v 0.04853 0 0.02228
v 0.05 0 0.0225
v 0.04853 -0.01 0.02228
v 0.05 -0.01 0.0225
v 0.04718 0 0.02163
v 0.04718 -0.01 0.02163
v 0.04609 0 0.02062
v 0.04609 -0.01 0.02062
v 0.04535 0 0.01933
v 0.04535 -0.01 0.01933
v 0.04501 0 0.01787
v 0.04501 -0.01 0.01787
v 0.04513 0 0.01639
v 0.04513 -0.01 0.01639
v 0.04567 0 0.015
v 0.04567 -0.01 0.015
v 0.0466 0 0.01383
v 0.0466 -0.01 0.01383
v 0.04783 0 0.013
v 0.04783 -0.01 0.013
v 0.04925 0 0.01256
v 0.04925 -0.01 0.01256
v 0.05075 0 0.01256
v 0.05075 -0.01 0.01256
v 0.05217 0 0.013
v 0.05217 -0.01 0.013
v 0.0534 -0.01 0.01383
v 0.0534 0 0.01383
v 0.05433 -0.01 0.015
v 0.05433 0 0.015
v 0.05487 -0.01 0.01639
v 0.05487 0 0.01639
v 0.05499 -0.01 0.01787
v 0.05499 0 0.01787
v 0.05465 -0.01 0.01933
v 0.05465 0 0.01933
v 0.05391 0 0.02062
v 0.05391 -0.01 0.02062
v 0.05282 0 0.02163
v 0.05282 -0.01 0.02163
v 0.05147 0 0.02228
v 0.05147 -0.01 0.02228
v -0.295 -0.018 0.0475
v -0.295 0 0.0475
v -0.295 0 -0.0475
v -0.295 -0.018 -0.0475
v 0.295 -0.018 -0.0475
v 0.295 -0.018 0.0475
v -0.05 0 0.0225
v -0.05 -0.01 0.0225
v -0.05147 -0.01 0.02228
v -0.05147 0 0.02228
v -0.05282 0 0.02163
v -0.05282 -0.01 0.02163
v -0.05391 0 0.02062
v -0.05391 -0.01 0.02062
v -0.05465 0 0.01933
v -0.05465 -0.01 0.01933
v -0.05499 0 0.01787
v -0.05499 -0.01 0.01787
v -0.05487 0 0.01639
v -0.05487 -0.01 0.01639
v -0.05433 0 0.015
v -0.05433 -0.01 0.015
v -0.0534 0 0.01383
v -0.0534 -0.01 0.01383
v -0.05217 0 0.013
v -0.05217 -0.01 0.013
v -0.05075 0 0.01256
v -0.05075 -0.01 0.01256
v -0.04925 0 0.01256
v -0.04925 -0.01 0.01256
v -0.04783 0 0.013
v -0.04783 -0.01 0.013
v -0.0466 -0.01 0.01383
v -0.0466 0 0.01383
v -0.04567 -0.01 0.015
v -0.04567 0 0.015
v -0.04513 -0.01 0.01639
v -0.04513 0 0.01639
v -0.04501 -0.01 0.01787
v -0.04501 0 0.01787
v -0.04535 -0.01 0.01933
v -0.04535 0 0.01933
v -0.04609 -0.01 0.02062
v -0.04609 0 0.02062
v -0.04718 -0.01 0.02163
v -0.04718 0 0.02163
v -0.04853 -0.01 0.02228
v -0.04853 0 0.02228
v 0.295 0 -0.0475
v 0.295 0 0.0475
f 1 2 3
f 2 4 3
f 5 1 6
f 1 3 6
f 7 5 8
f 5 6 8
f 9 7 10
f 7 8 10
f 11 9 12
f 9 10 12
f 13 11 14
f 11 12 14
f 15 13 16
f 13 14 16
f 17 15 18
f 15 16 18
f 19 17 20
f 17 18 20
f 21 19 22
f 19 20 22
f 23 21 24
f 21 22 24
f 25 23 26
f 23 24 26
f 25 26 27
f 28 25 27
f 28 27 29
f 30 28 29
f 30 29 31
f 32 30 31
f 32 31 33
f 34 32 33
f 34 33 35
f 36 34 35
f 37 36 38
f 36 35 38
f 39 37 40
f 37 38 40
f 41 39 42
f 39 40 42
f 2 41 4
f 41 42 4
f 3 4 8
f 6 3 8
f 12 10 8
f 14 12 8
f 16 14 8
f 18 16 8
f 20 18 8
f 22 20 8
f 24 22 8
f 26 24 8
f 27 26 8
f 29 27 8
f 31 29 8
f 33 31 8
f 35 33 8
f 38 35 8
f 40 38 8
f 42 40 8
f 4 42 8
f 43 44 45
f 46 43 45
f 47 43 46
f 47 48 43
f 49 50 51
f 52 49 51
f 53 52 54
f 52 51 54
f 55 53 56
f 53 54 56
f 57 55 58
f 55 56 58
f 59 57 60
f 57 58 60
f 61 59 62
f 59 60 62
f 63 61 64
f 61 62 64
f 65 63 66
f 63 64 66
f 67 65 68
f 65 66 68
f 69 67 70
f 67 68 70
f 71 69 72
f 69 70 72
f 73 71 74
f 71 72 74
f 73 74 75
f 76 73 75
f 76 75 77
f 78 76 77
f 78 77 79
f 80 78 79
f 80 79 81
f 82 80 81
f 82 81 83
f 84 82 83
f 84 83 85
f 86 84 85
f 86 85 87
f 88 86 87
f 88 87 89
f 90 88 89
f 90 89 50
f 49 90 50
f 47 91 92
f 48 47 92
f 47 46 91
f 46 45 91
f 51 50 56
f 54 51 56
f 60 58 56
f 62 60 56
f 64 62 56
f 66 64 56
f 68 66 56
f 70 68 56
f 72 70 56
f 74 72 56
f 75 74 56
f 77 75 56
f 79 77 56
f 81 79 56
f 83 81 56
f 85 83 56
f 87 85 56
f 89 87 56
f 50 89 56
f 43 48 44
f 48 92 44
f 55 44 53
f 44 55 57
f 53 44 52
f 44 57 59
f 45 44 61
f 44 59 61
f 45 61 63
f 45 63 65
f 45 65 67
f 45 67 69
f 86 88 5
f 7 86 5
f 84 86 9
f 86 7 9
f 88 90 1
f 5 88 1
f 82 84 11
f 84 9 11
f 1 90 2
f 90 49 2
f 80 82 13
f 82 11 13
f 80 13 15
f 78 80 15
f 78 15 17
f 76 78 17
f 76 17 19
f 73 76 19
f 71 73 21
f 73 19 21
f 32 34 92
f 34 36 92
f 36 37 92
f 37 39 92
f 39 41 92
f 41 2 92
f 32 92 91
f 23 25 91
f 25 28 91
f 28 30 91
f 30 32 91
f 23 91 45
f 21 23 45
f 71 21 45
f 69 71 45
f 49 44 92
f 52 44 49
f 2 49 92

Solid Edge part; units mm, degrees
sketch "Sketch1" plane through (0, 0, 0) normal (0, -1, 0) x (1, 0, 0)
  line L0 (-0.295, -0.0475) -> (0.295, -0.0475)
  line L1 (0.295, -0.0475) -> (0.295, 0.0475)
  line L2 (0.295, 0.0475) -> (-0.295, 0.0475)
  line L3 (-0.295, 0.0475) -> (-0.295, -0.0475)
  dimension "D1" = 0.095
  dimension "D2" = 0.59
extrude "Protrusion1" add sketch "Sketch1" along normal blind 0.018
hole "Bohrung_11" at (0.05, 0, 0.0175) direction (0, -1, 0) diameter 0.01 depth 0.01
hole "Hole1" at (-0.05, 0, 0.0175) direction (0, -1, 0) diameter 0.01 depth 0.01
